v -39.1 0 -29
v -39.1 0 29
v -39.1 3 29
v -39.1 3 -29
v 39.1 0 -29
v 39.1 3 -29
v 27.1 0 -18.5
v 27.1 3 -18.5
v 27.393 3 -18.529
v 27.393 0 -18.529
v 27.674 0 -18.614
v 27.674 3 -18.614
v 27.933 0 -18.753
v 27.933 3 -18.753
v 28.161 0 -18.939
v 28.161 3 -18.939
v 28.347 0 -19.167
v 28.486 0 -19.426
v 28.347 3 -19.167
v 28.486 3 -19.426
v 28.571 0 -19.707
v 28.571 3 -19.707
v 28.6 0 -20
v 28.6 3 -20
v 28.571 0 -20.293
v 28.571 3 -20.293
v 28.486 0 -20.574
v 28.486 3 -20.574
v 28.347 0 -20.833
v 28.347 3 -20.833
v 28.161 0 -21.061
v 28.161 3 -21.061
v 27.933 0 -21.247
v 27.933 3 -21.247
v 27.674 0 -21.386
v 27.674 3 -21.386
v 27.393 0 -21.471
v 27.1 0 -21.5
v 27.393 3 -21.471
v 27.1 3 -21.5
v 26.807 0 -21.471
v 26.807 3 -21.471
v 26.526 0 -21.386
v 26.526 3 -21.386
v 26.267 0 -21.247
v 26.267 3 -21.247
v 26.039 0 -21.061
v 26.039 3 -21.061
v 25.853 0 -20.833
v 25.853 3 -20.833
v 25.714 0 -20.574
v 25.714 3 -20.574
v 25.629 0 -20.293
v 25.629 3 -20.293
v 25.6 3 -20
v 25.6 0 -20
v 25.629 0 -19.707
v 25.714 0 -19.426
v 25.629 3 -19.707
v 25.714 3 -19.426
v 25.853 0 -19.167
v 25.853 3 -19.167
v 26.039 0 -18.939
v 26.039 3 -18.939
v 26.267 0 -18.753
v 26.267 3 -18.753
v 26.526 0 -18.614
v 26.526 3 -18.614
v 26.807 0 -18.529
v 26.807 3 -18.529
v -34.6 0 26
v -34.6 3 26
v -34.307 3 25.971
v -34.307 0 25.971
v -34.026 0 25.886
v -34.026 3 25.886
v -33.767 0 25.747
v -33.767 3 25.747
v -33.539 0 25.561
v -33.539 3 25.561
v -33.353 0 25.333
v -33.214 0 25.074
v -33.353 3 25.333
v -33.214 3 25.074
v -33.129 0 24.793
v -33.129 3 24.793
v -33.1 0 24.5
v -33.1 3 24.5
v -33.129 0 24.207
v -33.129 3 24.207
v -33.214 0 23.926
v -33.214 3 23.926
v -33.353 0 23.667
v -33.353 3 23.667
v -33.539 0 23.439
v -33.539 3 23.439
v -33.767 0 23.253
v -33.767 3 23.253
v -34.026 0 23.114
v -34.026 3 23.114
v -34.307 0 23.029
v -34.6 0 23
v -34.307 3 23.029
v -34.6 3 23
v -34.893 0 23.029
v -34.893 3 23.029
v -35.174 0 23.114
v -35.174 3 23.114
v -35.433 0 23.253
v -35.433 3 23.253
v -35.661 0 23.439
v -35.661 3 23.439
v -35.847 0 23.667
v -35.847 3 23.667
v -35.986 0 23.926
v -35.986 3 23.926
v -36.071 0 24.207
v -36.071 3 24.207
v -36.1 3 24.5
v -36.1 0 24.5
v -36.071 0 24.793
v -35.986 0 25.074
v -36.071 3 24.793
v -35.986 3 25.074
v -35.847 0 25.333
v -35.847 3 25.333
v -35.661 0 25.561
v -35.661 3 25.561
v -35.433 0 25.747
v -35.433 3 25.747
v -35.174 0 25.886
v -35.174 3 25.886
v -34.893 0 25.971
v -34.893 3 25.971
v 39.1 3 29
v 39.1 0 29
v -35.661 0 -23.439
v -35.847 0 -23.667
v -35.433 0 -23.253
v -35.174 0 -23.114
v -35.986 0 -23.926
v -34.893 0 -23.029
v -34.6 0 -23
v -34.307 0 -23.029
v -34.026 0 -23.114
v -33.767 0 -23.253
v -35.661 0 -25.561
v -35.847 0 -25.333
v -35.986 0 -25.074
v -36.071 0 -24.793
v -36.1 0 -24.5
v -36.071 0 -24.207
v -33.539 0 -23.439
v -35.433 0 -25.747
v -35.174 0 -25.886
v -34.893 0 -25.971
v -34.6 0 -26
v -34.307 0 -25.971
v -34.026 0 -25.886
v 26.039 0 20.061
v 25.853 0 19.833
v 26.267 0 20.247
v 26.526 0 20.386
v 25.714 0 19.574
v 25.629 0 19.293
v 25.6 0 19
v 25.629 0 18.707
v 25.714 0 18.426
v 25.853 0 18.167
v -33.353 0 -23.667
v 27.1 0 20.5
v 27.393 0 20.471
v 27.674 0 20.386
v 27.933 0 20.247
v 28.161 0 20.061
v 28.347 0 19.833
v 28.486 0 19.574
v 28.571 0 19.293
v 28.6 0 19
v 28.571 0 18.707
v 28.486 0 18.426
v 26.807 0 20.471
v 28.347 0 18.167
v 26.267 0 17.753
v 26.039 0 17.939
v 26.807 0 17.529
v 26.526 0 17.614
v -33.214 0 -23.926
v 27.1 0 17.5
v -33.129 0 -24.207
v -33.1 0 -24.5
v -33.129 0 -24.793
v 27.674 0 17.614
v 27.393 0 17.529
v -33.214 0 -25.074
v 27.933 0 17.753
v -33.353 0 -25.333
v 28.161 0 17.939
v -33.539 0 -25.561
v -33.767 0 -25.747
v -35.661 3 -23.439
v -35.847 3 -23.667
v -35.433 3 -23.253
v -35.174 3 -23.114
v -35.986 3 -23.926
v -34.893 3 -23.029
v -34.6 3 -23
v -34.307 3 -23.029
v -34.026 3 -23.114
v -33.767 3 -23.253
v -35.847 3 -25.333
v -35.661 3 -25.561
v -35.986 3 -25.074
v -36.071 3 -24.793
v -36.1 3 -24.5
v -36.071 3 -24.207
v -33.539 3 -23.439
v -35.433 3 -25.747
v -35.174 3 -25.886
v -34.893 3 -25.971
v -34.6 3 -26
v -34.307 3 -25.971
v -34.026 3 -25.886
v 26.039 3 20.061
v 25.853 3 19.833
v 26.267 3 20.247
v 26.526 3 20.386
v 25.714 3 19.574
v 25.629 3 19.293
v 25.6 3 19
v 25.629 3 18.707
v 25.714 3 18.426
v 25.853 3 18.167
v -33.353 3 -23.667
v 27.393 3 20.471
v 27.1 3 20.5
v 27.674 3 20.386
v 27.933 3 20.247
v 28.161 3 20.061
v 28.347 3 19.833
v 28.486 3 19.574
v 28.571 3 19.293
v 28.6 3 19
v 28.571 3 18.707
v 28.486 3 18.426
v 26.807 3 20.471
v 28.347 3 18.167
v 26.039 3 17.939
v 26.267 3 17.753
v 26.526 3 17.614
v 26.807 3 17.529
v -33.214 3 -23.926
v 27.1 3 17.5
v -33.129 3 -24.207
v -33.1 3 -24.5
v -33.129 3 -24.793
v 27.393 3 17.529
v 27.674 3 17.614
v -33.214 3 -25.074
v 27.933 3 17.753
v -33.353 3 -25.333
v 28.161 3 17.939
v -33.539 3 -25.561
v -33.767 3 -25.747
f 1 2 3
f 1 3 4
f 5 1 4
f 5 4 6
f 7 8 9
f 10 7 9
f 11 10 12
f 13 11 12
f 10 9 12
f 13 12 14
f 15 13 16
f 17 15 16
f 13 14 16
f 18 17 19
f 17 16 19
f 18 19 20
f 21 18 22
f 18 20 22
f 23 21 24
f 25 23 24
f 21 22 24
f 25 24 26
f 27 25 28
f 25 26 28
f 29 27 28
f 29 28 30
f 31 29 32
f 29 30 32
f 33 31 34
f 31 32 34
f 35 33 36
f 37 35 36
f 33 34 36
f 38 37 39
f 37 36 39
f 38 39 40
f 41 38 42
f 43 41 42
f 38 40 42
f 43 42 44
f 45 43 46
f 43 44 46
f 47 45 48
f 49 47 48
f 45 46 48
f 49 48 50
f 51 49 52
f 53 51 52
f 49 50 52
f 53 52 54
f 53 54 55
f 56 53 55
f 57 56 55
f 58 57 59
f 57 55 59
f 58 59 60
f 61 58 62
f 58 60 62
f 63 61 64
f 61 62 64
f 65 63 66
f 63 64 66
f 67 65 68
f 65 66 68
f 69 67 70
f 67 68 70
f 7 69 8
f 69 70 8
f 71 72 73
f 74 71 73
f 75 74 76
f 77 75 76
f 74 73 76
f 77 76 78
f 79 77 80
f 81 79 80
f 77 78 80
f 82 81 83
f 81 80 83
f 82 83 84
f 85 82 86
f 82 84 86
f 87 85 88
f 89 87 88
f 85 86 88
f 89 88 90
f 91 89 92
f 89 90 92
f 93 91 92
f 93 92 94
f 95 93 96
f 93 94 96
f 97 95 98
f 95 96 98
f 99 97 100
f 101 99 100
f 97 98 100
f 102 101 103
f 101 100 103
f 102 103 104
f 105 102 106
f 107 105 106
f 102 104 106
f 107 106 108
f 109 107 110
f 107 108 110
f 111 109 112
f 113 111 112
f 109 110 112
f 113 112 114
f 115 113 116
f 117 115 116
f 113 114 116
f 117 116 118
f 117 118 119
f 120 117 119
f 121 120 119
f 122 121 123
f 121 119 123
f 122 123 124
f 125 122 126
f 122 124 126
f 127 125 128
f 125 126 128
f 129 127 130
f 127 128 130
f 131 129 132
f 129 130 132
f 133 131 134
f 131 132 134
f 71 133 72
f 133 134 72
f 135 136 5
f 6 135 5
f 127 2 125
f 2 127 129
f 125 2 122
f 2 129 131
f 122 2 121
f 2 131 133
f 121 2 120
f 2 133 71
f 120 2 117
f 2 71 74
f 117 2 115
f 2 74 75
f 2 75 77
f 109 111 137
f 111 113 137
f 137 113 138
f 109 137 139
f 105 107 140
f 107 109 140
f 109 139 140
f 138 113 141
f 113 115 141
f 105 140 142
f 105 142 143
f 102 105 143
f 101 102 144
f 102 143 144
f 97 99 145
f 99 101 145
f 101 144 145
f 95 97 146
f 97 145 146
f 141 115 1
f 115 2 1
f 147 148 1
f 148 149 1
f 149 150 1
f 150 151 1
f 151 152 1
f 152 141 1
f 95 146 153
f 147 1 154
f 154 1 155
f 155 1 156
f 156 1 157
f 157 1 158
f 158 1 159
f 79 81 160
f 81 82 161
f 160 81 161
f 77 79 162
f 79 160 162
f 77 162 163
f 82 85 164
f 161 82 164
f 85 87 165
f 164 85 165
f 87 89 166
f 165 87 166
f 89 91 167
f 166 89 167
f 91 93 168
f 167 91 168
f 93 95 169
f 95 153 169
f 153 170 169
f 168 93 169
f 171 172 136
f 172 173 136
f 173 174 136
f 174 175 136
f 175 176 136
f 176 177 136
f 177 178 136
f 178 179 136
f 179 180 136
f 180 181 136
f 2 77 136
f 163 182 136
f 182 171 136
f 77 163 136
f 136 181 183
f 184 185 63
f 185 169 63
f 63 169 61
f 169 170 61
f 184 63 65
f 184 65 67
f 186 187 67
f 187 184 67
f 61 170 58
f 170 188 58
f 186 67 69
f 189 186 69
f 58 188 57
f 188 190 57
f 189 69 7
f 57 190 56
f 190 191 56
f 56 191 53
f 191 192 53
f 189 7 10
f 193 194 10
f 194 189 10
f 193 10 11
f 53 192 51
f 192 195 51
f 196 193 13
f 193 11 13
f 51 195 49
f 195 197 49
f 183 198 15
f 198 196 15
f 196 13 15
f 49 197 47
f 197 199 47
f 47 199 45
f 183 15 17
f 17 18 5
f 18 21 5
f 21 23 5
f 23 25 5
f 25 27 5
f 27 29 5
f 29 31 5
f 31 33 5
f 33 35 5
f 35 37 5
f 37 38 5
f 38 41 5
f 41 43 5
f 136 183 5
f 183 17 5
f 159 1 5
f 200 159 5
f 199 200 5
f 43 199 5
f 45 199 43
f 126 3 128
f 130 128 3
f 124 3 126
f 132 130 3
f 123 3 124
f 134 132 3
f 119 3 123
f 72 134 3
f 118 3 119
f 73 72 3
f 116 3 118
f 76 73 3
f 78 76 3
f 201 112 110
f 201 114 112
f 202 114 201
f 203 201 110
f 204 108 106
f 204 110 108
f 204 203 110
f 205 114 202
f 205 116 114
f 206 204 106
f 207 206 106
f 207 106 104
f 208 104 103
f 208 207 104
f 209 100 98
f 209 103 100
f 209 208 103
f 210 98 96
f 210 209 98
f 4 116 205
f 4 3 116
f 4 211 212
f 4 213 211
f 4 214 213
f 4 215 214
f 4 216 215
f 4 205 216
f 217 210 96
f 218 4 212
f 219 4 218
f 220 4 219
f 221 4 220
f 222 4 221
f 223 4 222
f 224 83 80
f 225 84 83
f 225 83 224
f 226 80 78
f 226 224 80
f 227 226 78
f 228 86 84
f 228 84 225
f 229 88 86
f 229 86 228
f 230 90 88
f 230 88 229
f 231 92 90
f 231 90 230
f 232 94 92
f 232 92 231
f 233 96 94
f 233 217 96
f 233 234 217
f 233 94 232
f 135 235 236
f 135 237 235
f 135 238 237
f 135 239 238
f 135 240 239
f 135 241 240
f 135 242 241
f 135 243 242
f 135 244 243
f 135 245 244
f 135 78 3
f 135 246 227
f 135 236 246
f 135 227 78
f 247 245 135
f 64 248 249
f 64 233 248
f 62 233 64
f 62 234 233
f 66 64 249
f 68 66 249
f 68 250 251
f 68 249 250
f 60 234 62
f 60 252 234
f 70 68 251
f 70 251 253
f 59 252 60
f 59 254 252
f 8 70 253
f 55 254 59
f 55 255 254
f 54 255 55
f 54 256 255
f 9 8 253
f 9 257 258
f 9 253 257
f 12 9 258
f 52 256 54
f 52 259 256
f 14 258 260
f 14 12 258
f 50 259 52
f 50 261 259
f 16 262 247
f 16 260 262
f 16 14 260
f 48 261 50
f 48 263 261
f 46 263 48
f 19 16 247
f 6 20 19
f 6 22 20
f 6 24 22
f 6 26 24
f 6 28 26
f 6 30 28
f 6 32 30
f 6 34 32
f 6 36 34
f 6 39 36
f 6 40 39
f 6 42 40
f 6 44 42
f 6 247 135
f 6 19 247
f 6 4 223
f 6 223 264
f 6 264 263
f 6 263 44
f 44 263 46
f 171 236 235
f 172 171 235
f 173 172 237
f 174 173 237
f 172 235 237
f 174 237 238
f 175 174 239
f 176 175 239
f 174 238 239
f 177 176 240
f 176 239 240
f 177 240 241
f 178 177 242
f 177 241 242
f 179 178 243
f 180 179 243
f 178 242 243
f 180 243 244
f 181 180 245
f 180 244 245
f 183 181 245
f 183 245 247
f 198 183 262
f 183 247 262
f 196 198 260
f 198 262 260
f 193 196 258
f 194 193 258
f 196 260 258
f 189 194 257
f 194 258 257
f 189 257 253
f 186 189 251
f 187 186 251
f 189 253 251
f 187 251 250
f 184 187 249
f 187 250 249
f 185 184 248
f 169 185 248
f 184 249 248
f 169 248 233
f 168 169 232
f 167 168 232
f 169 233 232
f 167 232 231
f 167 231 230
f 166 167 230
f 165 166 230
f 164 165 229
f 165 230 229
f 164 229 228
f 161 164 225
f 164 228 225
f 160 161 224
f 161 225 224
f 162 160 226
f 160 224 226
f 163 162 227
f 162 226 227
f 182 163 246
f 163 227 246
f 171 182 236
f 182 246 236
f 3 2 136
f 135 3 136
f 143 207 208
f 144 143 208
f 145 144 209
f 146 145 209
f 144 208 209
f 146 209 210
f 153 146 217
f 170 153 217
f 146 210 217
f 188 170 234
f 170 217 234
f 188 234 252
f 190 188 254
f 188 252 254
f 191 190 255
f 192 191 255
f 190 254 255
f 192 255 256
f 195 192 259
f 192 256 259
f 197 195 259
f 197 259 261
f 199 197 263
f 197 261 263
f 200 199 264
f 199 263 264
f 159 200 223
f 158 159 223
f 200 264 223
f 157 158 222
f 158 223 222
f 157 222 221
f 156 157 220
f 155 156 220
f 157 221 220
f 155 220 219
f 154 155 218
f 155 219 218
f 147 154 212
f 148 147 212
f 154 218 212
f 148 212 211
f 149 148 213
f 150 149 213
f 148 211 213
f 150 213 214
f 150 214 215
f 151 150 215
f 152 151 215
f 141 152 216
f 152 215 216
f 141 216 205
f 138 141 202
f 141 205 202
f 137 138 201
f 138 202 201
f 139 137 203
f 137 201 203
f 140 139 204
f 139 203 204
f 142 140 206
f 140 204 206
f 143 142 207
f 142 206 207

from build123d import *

# Parameters (mm, degrees)
SKETCH1_W           = 78.2
SKETCH1_H           = 58
BOSS_EXTRUDE1_DEPTH = 3
SKETCH2_R           = 1.5
CUT_EXTRUDE1_DEPTH  = 3
SKETCH3_R           = 1.5
CUT_EXTRUDE2_DEPTH  = 3


with BuildPart() as part:
    # Sketch1 → Boss-Extrude1 (new body)
    with BuildSketch(Plane(origin=(0, 0, 0), x_dir=(1, 0, 0), z_dir=(0, 1, 0))):
        Rectangle(SKETCH1_W, SKETCH1_H)
    extrude(amount=BOSS_EXTRUDE1_DEPTH)

    # Sketch2 → Cut-Extrude1 (cut)
    with BuildSketch(Plane(origin=(0, 3, 0), x_dir=(1, 0, 0), z_dir=(0, 1, 0))):
        with Locations(Location((-34.6, 24.5, 0), (0, 0, 270))):
            Circle(SKETCH2_R)
        with Locations(Location((-34.6, -24.5, 0), (0, 0, 270))):
            Circle(SKETCH2_R)
    extrude(amount=-CUT_EXTRUDE1_DEPTH, mode=Mode.SUBTRACT)

    # Sketch3 → Cut-Extrude2 (cut)
    with BuildSketch(Plane(origin=(0, 3, 0), x_dir=(1, 0, 0), z_dir=(0, 1, 0))):
        with Locations(Location((27.1, 20, 0), (0, 0, 270))):
            Circle(SKETCH3_R)
        with Locations(Location((27.1, -19, 0), (0, 0, 270))):
            Circle(SKETCH3_R)
    extrude(amount=-CUT_EXTRUDE2_DEPTH, mode=Mode.SUBTRACT)


solid = part.part
